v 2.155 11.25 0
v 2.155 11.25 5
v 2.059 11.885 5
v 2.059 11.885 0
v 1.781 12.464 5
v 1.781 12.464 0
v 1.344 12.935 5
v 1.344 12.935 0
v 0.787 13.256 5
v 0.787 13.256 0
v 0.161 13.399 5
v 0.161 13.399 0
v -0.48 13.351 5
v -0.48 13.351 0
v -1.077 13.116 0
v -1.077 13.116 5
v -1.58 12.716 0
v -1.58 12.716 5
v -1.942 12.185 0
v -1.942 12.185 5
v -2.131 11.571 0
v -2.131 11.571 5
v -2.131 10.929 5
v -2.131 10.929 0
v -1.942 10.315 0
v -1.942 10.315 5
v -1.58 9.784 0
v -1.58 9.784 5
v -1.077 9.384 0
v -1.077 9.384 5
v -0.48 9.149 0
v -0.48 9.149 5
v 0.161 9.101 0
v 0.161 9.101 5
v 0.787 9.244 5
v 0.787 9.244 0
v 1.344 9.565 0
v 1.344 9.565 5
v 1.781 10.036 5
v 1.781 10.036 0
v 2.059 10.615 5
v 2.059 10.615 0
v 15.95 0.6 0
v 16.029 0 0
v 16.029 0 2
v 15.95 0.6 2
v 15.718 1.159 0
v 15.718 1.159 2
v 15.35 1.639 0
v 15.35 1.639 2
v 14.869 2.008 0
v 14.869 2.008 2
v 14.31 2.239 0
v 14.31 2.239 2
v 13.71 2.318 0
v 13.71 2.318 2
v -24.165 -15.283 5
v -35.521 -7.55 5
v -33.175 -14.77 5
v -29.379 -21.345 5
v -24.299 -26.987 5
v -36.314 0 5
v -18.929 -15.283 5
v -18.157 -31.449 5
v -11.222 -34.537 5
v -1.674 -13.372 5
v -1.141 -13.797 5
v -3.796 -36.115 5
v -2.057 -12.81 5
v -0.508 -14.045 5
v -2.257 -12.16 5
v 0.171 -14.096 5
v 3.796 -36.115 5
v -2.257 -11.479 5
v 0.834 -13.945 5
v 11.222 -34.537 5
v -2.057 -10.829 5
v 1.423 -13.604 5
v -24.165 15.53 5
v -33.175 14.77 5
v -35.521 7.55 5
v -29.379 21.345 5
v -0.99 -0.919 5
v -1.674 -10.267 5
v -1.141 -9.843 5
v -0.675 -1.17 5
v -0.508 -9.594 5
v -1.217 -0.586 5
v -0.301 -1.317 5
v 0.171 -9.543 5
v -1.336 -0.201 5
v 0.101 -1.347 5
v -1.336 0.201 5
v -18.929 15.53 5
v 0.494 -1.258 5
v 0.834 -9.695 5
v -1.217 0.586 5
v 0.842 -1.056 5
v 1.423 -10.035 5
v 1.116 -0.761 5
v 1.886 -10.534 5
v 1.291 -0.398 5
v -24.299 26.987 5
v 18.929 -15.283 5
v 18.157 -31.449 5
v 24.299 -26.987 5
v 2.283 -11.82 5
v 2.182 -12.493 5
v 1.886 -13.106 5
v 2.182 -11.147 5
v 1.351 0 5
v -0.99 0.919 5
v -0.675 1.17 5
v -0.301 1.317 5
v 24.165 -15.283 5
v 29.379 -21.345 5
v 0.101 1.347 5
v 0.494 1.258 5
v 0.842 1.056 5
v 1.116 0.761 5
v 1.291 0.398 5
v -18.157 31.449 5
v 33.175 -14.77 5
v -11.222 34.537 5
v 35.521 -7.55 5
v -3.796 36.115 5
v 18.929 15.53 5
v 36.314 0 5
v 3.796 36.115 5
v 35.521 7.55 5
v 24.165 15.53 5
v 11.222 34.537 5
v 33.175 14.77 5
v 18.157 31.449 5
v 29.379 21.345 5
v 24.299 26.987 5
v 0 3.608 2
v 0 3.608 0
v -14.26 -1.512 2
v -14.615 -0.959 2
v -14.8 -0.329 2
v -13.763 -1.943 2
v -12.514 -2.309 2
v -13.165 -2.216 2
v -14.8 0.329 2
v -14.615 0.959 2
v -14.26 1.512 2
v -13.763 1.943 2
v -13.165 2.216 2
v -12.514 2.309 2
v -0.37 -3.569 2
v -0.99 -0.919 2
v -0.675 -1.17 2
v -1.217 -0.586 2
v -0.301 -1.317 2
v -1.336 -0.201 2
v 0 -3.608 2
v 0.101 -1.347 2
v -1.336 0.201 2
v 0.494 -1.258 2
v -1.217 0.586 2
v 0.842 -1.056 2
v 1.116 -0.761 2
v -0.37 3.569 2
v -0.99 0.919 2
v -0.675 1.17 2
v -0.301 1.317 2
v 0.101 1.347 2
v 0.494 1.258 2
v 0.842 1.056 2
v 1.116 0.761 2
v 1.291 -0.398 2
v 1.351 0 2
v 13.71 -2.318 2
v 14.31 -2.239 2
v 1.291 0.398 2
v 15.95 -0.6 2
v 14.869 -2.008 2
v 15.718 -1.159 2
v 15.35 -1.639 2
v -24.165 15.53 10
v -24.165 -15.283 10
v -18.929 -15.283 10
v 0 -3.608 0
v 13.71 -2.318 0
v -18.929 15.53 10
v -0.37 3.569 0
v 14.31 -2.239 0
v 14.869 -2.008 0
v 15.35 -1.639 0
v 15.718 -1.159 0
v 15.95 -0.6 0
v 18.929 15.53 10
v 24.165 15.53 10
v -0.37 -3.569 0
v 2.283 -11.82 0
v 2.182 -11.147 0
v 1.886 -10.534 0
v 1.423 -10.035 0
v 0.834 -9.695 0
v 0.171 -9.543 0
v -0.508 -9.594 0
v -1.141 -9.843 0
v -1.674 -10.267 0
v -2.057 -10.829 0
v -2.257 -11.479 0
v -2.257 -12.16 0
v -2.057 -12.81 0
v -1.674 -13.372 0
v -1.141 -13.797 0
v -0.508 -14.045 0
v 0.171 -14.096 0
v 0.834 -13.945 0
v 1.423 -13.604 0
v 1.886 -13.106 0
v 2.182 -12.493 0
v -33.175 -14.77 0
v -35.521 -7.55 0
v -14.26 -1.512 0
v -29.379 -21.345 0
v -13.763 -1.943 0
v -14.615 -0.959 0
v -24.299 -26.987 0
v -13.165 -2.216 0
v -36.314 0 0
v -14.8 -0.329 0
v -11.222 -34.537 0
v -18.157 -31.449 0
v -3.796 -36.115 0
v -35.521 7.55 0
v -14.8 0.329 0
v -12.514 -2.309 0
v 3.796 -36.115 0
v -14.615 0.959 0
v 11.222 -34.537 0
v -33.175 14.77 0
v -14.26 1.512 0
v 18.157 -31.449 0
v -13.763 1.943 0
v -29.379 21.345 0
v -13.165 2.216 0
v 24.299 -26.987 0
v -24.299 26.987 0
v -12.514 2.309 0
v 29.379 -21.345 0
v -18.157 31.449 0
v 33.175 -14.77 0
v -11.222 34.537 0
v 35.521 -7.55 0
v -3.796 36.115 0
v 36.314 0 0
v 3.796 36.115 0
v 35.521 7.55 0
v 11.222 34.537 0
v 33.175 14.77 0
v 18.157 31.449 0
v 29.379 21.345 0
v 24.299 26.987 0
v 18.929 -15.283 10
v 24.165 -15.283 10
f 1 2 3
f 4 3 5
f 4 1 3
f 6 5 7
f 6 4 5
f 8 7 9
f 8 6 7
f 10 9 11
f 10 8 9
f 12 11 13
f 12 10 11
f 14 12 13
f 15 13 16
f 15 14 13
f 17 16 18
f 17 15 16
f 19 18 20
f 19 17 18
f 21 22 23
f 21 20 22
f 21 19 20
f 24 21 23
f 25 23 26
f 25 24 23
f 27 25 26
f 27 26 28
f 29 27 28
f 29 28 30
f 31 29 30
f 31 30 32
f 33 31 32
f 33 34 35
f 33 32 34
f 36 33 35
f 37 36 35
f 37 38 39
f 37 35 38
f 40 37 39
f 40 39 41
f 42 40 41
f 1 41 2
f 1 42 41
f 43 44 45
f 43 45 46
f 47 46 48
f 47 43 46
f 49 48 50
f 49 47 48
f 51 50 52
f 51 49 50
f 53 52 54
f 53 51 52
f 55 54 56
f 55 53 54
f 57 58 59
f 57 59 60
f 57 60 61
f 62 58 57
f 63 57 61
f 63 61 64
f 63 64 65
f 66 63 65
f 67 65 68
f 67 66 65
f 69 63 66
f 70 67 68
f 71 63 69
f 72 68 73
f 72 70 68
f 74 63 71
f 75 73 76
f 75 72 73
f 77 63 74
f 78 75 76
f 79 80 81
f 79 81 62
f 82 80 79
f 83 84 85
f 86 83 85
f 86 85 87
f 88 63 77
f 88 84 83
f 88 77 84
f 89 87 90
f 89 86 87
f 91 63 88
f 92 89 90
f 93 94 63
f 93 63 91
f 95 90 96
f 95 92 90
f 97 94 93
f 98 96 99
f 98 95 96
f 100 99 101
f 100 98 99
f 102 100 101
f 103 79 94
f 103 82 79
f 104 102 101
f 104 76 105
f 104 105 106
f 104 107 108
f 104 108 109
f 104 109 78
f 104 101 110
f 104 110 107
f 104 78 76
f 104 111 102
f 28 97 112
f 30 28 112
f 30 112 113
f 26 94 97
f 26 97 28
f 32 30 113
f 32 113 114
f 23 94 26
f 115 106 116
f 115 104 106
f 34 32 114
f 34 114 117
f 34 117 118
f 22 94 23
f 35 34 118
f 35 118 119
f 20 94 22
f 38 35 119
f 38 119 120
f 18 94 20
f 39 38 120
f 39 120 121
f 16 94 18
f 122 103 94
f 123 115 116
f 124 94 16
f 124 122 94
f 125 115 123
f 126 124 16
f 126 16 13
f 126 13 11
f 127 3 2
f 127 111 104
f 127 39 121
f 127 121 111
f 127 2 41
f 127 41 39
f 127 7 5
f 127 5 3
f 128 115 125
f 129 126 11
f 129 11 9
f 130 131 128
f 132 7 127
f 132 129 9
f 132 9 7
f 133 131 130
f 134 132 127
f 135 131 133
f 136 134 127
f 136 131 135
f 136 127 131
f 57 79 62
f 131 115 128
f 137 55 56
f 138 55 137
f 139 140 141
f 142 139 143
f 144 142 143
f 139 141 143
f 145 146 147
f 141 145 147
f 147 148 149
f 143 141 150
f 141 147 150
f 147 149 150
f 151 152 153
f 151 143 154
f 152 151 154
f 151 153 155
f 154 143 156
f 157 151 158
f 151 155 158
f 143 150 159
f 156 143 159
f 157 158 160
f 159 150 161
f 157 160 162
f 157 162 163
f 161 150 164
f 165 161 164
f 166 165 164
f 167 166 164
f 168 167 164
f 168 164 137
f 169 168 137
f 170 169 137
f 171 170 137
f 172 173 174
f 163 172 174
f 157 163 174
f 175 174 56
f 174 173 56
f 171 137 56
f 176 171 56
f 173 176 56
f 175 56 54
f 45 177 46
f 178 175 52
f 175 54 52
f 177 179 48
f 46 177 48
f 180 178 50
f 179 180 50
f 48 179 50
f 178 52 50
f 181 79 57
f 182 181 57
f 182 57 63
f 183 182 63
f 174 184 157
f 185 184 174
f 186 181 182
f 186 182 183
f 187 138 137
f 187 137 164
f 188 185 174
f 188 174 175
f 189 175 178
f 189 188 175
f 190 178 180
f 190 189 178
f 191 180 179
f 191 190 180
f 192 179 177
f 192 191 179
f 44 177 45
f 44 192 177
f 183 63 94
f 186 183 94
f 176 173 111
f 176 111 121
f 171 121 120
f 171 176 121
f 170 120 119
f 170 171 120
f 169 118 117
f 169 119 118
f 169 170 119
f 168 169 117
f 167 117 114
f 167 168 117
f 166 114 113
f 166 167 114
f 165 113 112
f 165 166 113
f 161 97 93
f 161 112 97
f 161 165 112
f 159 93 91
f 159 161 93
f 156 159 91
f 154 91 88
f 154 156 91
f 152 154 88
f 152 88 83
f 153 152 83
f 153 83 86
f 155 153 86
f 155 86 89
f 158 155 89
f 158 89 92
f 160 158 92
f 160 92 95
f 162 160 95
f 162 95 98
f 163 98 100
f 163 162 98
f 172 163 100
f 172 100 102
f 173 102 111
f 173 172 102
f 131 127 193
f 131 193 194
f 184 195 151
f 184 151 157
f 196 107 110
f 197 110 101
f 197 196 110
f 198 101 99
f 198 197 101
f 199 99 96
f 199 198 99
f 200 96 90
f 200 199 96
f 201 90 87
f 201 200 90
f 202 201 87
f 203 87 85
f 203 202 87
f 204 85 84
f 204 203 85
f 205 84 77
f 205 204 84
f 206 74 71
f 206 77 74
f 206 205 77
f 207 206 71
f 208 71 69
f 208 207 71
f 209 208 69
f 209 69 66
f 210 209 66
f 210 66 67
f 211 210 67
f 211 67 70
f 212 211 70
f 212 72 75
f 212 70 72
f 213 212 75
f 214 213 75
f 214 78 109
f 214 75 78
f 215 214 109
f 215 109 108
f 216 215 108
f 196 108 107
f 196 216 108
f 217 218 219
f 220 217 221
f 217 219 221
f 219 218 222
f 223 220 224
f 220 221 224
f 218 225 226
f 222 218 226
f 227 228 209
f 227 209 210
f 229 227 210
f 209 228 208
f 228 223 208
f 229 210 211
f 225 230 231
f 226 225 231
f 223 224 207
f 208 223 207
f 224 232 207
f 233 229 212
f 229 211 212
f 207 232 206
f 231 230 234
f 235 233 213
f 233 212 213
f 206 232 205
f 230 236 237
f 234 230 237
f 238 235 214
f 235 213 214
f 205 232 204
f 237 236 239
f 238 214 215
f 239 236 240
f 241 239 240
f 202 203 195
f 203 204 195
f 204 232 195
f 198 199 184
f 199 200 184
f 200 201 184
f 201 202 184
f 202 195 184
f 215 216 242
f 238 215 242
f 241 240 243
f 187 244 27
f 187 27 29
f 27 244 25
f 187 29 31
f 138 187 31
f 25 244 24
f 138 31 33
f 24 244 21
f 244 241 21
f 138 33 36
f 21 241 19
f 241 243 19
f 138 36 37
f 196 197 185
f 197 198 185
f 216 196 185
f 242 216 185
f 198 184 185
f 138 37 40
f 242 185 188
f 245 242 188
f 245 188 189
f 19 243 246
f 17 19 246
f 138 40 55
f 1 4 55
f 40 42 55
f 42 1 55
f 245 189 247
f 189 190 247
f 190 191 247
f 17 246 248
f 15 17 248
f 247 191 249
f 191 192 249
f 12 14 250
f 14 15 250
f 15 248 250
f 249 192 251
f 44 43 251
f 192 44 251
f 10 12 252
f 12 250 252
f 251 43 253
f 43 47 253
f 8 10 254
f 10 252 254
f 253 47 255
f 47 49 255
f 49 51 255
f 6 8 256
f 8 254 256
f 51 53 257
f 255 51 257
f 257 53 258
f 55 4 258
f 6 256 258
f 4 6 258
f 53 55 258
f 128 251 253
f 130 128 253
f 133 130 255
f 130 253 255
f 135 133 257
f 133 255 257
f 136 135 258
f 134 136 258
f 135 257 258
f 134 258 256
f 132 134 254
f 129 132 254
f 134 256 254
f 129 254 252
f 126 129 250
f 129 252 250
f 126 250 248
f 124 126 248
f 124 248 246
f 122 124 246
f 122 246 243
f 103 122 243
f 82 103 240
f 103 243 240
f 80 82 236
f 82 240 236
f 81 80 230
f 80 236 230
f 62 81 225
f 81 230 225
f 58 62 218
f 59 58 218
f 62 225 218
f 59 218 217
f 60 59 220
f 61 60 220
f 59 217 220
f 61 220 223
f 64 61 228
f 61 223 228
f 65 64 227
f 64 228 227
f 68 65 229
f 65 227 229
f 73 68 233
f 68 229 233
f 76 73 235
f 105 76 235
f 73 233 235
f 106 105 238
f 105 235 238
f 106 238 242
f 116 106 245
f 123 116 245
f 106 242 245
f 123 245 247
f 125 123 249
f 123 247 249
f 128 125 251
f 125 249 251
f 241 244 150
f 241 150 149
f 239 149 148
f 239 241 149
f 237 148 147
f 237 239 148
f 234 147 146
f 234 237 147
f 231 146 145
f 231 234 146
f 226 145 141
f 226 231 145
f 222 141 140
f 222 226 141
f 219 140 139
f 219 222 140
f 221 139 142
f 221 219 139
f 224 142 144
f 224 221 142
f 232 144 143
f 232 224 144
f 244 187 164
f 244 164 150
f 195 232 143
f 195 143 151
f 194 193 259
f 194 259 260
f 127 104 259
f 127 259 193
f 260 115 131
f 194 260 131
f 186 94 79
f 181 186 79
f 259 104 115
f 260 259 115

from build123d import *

# Parameters (mm, degrees)
F0_R     = 36.3144122586
F3_DEPTH = 5
F1_W     = 5.236171186
F1_H     = 30.8128492907
F4_DEPTH = 10
F2_R     = 2.2829264836
F2_R_2   = 1.3509728807
F2_R_3   = 2.1549795906
F5_DEPTH = 25
F7_DEPTH = 2


with BuildPart() as f3:
    # F0 (on Top) → F3 (new body)
    with BuildSketch(Plane.XY):
        Circle(F0_R)
    extrude(amount=F3_DEPTH)

    # F1 (on Top) → F4 (join)
    with BuildSketch(Plane.XY):
        with Locations((21.547390148, 0.1232274808)):
            Rectangle(F1_W, F1_H)
        Polygon((-24.165475741, 15.5296521261), (-24.165475741, 0), (-24.165475741, -15.2831971645), (-18.9293045551, -15.2831971645), (-18.9293045551, 15.5296521261), align=None)
    extrude(amount=F4_DEPTH)

    # F2 (on Top) → F5 (cut)
    with BuildSketch(Plane.XY):
        with Locations((0, -11.8196206167)):
            Circle(F2_R)
        Circle(F2_R_2)
        with Locations((0, 11.250000447)):
            Circle(F2_R_3)
    extrude(amount=F5_DEPTH, mode=Mode.SUBTRACT)

    # F6 (on Top) → F7 (cut)
    with BuildSketch(Plane.XY):
        with BuildLine():
            ThreePointArc((-0.3703859768, -3.5693595734), (2.402953818, -2.6652066495), (3.5885252592, 0))
            ThreePointArc((3.5885252592, 0), (2.402953818, 2.6652066495), (-0.3703859768, 3.5693595734))
            ThreePointArc((-0.3703859768, 3.5693595734), (-3.5885252592, 0), (-0.3703859768, -3.5693595734))
        make_face()
        with BuildLine():
            ThreePointArc((-0.3703859768, 3.5693595734), (2.402953818, 2.6652066495), (3.5885252592, 0))
            ThreePointArc((3.5885252592, 0), (2.402953818, -2.6652066495), (-0.3703859768, -3.5693595734))
            Line((-0.3703859768, -3.5693595734), (0, -3.6077938568))
            Line((0, -3.6077938568), (13.7103013694, -2.3183212426))
            ThreePointArc((13.7103013694, -2.3183212426), (11.3919801268, 0), (13.7103013694, 2.3183212426))
            Line((13.7103013694, 2.3183212426), (0, 3.6077938568))
            Line((0, 3.6077938568), (-0.3703859768, 3.5693595734))
        make_face()
        with BuildLine():
            ThreePointArc((-0.3703859768, -3.5693595734), (-3.5885252592, 0), (-0.3703859768, 3.5693595734))
            Line((-0.3703859768, 3.5693595734), (-12.5144906342, 2.3091877811))
            ThreePointArc((-12.5144906342, 2.3091877811), (-10.8816482952, 1.632842339), (-10.2053028531, 0))
            ThreePointArc((-10.2053028531, 0), (-10.8816482952, -1.632842339), (-12.5144906342, -2.3091877811))
            Line((-12.5144906342, -2.3091877811), (-0.3703859768, -3.5693595734))
        make_face()
        with BuildLine():
            Line((-12.5144906342, 0), (-12.5144906342, 2.3091877811))
            ThreePointArc((-12.5144906342, 2.3091877811), (-14.8236784153, 0), (-12.5144906342, -2.3091877811))
            Line((-12.5144906342, -2.3091877811), (-12.5144906342, 0))
        make_face()
        with BuildLine():
            ThreePointArc((-10.2053028531, 0), (-10.8816482952, 1.632842339), (-12.5144906342, 2.3091877811))
            Line((-12.5144906342, 2.3091877811), (-12.5144906342, 0))
            Line((-12.5144906342, 0), (-12.5144906342, -2.3091877811))
            ThreePointArc((-12.5144906342, -2.3091877811), (-10.8816482952, -1.632842339), (-10.2053028531, 0))
        make_face()
        with BuildLine():
            Line((13.7103013694, 0), (13.7103013694, 2.3183212426))
            ThreePointArc((13.7103013694, 2.3183212426), (11.3919801268, 0), (13.7103013694, -2.3183212426))
            Line((13.7103013694, -2.3183212426), (13.7103013694, 0))
        make_face()
        with BuildLine():
            ThreePointArc((16.0286226121, 0), (15.3496020411, 1.6393006716), (13.7103013694, 2.3183212426))
            Line((13.7103013694, 2.3183212426), (13.7103013694, 0))
            Line((13.7103013694, 0), (13.7103013694, -2.3183212426))
            ThreePointArc((13.7103013694, -2.3183212426), (15.3496020411, -1.6393006716), (16.0286226121, 0))
        make_face()
    extrude(amount=F7_DEPTH, mode=Mode.SUBTRACT)


solid = f3.part
